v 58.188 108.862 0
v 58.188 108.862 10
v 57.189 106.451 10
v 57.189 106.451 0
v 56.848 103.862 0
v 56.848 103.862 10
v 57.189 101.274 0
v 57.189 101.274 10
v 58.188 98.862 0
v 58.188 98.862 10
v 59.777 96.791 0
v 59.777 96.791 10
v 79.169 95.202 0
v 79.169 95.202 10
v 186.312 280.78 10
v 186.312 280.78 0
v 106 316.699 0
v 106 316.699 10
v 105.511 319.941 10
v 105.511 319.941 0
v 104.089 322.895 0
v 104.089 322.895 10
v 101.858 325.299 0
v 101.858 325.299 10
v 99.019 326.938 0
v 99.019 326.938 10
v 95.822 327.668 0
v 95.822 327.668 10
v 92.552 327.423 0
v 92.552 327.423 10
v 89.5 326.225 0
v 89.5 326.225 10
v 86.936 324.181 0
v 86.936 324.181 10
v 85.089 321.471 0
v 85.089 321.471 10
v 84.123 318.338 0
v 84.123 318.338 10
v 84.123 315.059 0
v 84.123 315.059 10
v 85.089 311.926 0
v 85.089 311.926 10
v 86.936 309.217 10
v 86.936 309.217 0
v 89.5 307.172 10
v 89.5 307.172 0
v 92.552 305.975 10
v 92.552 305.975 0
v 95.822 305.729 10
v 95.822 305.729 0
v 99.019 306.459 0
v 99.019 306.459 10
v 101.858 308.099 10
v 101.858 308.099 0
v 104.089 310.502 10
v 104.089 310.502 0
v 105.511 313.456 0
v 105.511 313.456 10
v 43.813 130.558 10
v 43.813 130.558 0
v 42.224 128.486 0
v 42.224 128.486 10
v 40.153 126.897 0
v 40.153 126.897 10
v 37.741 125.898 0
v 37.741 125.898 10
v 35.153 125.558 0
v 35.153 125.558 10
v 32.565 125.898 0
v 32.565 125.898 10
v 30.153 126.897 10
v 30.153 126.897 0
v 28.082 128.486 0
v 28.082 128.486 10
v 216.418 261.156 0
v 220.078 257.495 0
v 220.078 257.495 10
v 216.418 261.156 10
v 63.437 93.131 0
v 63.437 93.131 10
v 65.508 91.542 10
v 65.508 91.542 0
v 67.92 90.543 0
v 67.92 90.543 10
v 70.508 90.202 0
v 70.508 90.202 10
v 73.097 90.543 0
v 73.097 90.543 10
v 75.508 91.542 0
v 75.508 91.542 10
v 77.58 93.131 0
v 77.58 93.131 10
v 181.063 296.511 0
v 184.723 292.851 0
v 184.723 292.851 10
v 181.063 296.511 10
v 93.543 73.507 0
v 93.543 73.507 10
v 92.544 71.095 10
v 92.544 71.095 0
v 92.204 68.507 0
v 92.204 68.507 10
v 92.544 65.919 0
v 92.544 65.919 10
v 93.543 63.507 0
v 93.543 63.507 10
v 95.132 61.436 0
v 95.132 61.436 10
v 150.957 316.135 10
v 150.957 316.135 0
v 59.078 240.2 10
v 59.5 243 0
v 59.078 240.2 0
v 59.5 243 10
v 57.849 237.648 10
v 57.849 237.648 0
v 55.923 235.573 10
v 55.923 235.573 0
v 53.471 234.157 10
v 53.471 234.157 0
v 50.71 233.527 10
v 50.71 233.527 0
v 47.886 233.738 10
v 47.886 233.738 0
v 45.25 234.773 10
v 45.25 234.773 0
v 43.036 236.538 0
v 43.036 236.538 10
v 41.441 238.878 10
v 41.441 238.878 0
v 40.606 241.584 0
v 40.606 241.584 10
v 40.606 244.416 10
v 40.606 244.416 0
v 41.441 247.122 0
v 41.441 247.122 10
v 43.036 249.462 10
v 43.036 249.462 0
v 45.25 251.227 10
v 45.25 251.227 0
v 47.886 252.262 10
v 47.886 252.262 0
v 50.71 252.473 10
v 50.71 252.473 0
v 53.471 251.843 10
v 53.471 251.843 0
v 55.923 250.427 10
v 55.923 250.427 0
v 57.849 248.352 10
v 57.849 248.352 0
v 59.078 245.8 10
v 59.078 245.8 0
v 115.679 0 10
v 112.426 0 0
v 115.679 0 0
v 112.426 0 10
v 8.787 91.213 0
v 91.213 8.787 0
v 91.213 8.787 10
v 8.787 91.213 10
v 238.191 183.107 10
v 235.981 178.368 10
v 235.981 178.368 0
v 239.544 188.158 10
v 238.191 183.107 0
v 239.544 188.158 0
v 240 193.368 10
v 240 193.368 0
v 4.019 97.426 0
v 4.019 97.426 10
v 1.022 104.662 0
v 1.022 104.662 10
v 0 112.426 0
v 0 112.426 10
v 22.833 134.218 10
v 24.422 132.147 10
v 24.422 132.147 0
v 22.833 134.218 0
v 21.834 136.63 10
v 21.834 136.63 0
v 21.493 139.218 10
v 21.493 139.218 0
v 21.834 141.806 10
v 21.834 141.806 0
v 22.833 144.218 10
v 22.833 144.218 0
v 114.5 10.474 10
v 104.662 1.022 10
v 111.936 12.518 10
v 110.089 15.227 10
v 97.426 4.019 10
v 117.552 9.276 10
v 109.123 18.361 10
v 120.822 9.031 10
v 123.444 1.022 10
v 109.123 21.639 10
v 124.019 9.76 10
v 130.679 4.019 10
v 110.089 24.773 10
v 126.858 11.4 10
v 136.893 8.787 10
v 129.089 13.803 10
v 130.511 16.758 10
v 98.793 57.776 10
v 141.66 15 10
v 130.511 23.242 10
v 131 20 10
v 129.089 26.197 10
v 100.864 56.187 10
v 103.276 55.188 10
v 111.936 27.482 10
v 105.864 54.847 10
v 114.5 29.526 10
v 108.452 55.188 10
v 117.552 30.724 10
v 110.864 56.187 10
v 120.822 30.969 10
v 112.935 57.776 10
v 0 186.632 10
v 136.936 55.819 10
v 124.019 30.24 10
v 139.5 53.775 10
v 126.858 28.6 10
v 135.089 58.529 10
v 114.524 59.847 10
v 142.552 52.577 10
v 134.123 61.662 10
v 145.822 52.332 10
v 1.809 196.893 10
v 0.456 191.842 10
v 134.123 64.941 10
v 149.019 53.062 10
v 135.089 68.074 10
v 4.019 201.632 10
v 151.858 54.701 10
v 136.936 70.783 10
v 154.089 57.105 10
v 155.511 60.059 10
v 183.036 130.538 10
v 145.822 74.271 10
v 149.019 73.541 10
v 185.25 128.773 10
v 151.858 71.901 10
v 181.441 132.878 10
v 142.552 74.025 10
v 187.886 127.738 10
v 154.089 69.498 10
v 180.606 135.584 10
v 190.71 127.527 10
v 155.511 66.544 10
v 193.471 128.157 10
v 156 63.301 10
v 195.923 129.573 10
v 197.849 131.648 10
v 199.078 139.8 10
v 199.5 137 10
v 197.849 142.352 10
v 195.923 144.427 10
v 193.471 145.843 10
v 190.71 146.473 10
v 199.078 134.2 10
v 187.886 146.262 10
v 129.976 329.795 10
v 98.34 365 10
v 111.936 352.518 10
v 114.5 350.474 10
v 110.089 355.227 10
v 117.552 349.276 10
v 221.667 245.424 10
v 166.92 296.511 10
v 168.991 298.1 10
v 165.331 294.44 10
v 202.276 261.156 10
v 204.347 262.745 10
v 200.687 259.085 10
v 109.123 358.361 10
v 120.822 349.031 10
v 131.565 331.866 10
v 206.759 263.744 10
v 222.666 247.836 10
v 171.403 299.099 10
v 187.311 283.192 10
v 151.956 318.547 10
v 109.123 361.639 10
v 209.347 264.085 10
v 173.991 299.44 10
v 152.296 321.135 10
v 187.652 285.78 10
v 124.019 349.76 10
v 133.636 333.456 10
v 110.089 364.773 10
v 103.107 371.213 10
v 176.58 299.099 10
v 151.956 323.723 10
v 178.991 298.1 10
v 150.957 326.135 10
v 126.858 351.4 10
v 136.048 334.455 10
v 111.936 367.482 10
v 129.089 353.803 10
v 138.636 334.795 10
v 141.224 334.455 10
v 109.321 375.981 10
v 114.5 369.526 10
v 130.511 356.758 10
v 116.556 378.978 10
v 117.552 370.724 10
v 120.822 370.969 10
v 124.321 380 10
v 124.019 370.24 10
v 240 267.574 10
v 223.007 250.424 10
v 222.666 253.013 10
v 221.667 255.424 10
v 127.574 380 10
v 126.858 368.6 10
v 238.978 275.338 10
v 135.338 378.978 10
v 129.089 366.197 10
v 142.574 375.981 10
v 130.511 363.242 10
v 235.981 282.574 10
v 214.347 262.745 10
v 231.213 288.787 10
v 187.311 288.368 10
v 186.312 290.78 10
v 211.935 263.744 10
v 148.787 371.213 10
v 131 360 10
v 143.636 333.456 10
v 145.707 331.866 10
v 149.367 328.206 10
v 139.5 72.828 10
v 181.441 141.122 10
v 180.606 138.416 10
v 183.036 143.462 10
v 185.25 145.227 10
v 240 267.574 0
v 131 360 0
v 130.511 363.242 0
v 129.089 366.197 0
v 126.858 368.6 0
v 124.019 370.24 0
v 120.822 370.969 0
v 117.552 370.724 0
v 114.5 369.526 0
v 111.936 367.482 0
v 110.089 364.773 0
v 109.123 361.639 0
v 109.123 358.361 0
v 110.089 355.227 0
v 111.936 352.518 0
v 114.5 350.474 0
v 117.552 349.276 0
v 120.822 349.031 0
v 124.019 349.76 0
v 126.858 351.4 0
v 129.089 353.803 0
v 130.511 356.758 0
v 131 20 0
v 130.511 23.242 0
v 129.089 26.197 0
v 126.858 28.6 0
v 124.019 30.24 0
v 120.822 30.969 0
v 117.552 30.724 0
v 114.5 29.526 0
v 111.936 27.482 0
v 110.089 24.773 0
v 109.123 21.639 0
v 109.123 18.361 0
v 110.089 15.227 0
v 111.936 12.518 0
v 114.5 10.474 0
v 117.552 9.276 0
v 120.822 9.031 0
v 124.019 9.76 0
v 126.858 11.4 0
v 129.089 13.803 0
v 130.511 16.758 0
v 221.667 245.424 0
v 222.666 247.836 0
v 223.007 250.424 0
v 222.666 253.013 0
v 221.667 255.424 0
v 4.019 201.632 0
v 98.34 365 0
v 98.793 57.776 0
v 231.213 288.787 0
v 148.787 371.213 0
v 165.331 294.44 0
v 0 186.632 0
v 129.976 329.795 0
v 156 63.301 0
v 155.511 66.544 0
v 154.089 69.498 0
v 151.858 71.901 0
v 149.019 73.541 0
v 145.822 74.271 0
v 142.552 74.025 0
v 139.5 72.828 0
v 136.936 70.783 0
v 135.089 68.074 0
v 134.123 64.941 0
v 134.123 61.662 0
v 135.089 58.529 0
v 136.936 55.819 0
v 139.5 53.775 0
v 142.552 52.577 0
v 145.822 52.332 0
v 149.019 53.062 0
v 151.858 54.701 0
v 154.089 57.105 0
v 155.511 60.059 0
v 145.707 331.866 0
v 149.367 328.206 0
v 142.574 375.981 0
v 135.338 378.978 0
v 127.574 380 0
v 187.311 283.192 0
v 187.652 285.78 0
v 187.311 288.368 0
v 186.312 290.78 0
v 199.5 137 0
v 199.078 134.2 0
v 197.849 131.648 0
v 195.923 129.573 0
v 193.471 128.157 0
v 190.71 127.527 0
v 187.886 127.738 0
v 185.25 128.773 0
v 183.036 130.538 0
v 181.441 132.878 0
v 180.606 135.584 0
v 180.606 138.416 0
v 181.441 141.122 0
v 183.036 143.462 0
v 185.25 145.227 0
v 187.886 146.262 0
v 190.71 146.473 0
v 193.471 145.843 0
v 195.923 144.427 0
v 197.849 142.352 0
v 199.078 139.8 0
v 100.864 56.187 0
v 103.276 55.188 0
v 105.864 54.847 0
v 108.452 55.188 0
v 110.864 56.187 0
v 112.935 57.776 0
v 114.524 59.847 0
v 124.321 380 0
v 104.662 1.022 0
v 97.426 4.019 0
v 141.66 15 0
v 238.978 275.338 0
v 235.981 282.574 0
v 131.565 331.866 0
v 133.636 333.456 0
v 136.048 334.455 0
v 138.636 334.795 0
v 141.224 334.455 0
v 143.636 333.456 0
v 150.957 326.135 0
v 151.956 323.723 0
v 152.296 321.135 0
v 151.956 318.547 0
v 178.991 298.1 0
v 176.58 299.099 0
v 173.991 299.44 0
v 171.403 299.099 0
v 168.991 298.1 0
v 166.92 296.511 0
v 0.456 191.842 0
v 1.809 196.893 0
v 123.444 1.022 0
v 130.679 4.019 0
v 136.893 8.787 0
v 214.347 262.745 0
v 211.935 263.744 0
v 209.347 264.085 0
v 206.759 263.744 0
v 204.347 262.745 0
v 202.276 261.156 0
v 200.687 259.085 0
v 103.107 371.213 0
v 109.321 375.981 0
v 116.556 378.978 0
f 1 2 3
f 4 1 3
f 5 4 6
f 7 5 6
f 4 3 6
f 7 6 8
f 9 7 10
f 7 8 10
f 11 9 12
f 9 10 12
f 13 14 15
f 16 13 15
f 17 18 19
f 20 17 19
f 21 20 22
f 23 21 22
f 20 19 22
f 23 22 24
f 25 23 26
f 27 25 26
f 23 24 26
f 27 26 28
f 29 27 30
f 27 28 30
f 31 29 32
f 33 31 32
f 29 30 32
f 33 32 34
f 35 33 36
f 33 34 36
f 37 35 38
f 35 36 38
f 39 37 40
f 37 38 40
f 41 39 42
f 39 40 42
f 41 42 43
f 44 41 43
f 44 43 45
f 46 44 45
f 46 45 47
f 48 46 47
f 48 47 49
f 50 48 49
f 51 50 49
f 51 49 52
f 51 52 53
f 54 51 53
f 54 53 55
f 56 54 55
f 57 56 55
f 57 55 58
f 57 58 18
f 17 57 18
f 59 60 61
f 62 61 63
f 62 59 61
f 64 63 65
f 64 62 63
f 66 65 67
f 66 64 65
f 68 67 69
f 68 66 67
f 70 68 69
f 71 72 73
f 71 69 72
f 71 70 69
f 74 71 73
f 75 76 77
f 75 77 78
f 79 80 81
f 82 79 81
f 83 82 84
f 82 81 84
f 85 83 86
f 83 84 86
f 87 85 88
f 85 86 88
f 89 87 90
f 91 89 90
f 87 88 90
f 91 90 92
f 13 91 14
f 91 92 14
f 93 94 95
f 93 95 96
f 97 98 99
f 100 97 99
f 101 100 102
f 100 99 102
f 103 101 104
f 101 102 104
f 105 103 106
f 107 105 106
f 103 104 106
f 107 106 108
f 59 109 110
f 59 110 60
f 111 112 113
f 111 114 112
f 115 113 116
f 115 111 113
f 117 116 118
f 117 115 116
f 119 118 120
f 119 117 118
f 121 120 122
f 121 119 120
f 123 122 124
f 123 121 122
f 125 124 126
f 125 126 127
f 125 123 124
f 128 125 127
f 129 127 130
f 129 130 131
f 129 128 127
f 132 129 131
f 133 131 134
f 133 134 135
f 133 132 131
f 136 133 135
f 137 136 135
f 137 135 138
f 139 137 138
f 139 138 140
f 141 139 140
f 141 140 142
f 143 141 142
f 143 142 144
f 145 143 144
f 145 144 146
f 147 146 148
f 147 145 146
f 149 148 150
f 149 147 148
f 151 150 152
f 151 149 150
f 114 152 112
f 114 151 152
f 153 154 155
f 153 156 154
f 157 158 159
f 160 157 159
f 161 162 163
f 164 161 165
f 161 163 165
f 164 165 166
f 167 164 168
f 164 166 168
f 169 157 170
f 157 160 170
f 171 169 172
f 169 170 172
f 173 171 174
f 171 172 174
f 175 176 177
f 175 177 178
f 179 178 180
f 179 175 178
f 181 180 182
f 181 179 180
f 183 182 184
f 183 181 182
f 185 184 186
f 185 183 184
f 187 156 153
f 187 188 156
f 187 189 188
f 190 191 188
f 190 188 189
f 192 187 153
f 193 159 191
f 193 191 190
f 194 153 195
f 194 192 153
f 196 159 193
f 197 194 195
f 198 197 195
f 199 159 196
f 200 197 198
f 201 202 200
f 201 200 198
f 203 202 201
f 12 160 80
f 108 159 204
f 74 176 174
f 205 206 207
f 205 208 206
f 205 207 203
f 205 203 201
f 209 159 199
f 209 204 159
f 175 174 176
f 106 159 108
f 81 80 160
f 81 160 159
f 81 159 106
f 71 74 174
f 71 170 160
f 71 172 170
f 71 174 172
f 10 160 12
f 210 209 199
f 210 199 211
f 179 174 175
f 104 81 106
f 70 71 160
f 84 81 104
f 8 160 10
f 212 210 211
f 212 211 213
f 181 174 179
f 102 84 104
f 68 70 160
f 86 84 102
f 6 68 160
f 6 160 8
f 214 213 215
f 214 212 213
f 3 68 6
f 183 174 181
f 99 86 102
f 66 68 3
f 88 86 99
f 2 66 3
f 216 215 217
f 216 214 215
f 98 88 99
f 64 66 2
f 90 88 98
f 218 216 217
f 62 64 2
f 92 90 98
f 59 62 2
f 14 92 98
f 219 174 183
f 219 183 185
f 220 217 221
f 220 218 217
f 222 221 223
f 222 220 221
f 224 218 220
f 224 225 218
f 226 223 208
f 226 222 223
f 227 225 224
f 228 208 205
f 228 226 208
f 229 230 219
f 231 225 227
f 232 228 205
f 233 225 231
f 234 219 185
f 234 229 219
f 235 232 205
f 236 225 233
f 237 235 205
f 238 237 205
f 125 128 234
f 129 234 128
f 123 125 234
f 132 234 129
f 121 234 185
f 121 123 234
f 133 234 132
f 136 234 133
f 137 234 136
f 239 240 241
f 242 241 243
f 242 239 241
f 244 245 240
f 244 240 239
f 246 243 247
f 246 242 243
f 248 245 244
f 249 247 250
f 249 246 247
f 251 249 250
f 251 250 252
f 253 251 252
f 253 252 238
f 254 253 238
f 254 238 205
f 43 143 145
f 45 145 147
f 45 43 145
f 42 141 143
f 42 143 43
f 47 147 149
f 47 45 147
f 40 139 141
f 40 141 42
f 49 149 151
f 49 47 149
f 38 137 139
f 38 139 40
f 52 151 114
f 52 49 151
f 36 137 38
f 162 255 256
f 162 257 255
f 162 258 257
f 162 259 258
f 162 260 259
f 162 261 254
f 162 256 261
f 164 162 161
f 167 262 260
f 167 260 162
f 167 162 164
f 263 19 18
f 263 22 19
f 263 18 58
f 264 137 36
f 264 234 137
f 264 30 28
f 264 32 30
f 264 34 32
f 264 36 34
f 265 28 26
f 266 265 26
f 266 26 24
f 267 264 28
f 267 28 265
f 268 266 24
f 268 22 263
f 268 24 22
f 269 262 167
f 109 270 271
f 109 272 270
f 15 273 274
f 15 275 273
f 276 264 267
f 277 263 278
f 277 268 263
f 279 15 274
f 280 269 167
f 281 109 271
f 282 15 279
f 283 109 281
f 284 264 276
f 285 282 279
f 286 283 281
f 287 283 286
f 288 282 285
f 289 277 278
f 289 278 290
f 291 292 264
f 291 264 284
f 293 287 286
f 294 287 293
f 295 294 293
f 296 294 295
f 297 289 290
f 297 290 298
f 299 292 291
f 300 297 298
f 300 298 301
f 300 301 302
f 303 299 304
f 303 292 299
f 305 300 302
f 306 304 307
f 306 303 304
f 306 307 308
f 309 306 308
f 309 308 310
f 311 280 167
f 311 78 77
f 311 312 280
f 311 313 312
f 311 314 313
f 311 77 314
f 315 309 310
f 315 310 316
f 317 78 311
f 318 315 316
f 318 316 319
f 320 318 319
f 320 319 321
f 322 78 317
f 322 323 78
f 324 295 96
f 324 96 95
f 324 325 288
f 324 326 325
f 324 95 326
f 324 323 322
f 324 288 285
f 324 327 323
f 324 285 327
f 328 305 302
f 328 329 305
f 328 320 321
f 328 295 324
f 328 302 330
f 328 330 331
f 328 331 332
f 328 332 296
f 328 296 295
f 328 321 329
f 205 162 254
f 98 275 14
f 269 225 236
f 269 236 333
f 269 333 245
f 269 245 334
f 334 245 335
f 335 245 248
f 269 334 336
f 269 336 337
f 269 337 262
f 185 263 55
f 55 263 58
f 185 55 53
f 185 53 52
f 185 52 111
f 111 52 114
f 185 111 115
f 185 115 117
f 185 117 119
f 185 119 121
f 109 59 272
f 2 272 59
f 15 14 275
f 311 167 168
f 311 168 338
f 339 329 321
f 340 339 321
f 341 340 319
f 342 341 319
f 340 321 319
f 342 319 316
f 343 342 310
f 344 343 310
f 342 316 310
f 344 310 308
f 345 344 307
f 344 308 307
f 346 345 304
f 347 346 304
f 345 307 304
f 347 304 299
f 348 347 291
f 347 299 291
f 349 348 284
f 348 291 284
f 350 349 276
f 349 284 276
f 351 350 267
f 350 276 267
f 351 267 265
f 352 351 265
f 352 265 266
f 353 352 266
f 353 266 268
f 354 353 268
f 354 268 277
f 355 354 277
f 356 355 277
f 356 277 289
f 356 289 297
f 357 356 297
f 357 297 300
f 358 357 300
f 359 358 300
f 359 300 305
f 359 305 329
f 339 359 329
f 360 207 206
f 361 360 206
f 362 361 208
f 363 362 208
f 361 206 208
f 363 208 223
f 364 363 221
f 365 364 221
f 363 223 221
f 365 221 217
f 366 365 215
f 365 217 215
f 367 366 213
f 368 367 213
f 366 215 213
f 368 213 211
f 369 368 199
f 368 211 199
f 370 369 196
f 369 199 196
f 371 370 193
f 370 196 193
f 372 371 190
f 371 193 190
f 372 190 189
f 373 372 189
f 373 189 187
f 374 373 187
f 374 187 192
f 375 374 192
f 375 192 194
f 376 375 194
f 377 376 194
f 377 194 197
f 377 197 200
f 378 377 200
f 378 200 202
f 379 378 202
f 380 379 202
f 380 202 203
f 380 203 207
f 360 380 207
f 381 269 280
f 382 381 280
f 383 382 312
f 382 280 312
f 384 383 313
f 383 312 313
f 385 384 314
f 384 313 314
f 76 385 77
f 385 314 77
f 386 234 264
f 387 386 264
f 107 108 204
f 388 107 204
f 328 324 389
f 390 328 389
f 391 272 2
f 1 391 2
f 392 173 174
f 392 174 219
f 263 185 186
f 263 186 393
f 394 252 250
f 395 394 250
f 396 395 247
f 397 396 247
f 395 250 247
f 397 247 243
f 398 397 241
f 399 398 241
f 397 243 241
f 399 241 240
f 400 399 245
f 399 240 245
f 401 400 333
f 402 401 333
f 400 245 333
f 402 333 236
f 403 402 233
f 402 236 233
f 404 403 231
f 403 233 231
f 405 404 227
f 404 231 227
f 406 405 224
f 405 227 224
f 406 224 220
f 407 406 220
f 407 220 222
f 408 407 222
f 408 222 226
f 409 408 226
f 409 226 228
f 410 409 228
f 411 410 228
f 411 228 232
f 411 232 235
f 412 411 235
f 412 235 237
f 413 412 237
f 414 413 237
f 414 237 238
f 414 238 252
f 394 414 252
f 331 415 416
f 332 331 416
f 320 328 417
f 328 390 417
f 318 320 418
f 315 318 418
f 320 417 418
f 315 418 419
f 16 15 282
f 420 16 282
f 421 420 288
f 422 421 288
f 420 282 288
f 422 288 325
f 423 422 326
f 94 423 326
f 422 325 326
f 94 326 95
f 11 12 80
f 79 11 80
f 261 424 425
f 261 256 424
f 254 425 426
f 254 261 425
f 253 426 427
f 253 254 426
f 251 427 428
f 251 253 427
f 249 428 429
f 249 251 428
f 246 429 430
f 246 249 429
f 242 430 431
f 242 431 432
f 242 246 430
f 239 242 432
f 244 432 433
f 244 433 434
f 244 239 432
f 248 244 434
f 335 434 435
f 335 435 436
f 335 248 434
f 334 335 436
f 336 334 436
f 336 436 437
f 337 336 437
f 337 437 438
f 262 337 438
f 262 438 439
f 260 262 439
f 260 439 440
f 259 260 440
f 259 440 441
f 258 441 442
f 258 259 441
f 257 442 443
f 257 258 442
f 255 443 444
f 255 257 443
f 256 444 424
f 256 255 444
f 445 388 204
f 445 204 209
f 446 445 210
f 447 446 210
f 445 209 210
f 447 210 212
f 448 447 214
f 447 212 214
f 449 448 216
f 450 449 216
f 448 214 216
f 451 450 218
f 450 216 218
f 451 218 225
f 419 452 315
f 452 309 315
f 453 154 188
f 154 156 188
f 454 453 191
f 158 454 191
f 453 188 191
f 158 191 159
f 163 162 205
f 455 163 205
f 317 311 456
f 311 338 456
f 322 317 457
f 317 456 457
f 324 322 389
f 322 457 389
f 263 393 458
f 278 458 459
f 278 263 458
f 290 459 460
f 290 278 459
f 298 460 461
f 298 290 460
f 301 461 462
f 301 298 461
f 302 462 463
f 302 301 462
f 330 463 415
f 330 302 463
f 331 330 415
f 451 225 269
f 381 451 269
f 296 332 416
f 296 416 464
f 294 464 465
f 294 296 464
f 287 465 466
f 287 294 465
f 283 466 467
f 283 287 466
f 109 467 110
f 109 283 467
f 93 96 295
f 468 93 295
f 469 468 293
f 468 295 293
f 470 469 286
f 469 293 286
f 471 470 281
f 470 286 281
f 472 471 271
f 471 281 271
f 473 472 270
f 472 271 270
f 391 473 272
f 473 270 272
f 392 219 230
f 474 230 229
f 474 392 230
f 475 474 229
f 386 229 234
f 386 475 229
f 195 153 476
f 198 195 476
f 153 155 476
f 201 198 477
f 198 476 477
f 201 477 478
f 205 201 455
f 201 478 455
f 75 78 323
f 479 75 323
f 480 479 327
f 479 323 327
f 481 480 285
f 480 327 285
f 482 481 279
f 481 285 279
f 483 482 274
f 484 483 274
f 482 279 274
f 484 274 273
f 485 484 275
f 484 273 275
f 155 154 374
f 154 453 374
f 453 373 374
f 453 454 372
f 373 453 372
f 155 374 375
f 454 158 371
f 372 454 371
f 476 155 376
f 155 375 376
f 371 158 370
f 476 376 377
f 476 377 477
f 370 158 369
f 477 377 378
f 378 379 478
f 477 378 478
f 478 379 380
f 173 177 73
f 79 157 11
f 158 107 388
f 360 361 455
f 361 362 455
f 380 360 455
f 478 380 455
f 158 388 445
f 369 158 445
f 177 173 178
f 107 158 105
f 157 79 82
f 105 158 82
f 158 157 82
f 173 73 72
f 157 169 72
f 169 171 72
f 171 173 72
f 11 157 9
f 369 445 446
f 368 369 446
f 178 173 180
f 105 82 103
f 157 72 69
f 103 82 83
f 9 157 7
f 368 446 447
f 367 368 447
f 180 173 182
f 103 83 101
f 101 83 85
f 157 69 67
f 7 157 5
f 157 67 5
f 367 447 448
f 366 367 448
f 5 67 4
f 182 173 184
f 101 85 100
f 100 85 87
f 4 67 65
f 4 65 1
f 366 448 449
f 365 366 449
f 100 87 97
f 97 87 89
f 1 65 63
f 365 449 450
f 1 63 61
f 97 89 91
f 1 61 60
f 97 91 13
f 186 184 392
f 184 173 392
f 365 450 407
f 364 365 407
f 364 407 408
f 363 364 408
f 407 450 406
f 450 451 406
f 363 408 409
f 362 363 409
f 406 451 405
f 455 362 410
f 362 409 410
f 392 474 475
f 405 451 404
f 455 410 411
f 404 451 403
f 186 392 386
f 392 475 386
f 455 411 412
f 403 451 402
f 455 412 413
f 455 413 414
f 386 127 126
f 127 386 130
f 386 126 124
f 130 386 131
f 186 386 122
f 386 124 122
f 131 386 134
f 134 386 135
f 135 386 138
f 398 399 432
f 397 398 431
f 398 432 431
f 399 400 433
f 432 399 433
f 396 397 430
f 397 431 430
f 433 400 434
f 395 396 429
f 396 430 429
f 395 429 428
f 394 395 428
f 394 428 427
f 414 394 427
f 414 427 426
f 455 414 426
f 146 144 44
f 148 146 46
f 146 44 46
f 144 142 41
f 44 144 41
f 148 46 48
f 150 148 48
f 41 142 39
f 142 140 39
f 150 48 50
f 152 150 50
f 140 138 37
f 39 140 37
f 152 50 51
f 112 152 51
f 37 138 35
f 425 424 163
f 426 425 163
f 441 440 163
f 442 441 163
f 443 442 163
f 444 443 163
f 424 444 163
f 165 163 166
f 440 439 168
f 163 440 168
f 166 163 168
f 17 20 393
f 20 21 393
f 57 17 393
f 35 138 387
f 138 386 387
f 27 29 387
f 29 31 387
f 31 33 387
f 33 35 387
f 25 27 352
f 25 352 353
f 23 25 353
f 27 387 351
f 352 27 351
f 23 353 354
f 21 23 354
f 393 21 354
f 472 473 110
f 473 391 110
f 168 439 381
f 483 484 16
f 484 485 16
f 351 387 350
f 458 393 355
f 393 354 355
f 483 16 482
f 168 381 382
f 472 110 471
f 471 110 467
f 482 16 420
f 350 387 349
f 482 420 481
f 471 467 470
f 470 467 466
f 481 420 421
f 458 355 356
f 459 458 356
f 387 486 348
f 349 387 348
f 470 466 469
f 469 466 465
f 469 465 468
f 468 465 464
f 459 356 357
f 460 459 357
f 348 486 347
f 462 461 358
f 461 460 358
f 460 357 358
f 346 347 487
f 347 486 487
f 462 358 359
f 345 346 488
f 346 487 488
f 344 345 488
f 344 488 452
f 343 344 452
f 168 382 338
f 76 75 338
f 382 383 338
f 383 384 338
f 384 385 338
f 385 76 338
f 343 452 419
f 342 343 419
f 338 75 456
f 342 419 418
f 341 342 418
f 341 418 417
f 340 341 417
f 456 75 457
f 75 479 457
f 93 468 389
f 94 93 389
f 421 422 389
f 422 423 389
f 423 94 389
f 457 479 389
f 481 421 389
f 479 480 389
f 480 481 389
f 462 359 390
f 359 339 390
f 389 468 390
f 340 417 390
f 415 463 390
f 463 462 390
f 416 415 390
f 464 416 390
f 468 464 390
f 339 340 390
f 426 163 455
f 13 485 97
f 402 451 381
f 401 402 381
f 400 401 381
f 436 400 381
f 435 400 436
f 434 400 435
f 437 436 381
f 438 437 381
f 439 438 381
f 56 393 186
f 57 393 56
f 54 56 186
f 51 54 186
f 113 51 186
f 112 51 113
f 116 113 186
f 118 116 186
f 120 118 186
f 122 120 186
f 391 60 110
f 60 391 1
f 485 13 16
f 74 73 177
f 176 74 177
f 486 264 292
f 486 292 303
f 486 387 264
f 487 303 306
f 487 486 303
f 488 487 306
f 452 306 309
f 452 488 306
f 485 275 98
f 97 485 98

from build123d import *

# Parameters (mm, degrees)
SKETCH_1_W           = 200
SKETCH_1_H           = 380
EXTRUDE_1_DEPTH      = 10
SKETCH_2_R           = 11
CUT_EXTRUDE_1_DEPTH  = 430.534631898
SKETCH_3_R           = 8
CUT_EXTRUDE_2_DEPTH  = 430.534631898
SKETCH_4_R           = 9.5
CUT_EXTRUDE_3_DEPTH  = 6
CUT_EXTRUDE_START    = -6
SKETCH_5_R           = 9.5
CUT_EXTRUDE_4_DEPTH  = 6
SKETCH_6_R           = 11
CUT_EXTRUDE_5_DEPTH  = 430.534631898
SKETCH_7_R           = 8
CUT_EXTRUDE_6_DEPTH  = 430.534631898
SKETCH_8_R           = 9.5
CUT_EXTRUDE_7_DEPTH  = 6
SKETCH_9_R           = 9.5
CUT_EXTRUDE_8_DEPTH  = 6
SKETCH_10_W          = 40
SKETCH_10_H          = 380
EXTRUDE_3_DEPTH      = 10
CUT_EXTRUDE_9_DEPTH  = 450.55533586
CHAMFER_1_SIZE       = 100
FILLET_1_R           = 30
CUT_EXTRUDE_10_DEPTH = 450.55533586


with BuildPart() as part:
    # 草图1 → 凸台-拉伸1 (new body)
    with BuildSketch(Plane.XY):
        with Locations((100, 190)):
            Rectangle(SKETCH_1_W, SKETCH_1_H)
    extrude(amount=EXTRUDE_1_DEPTH)

    # 草图2 → 切除-拉伸1 (cut, through all)
    with BuildSketch(Plane.XY.offset(10)):
        with Locations((120, 20)):
            Circle(SKETCH_2_R)
        with Locations((145, 63.301270189)):
            Circle(SKETCH_2_R)
    extrude(amount=-CUT_EXTRUDE_1_DEPTH, mode=Mode.SUBTRACT)

    # 草图3 → 切除-拉伸2 (cut, through all)
    with BuildSketch(Plane.XY.offset(10)):
        with Locations((50, 243)):
            Circle(SKETCH_3_R)
    extrude(amount=-CUT_EXTRUDE_2_DEPTH, mode=Mode.SUBTRACT)

    # 草图4 → 切除-拉伸3 (cut)
    with BuildSketch(Plane.XY.offset(10)):
        with Locations((50, 243)):
            Circle(SKETCH_4_R)
    extrude(amount=-CUT_EXTRUDE_3_DEPTH, mode=Mode.SUBTRACT)

    # 草图5 → 切除-拉伸4 (cut)
    with BuildSketch(Plane(origin=(0, 0, 0), x_dir=(-1, 0, 0), z_dir=(0, 0, -1)).offset(CUT_EXTRUDE_START)):
        with Locations(Location((-50, 243, 0), (0, 0, 180))):
            Circle(SKETCH_5_R)
    extrude(amount=CUT_EXTRUDE_4_DEPTH, mode=Mode.SUBTRACT)

    # 草图6 → 切除-拉伸5 (cut, through all)
    with BuildSketch(Plane.XY.offset(10)):
        with Locations((95, 316.698729811)):
            Circle(SKETCH_6_R)
        with Locations((120, 360)):
            Circle(SKETCH_6_R)
    extrude(amount=-CUT_EXTRUDE_5_DEPTH, mode=Mode.SUBTRACT)

    # 草图7 → 切除-拉伸6 (cut, through all)
    with BuildSketch(Plane.XY.offset(10)):
        with Locations((190, 137)):
            Circle(SKETCH_7_R)
    extrude(amount=-CUT_EXTRUDE_6_DEPTH, mode=Mode.SUBTRACT)

    # 草图8 → 切除-拉伸7 (cut)
    with BuildSketch(Plane.XY.offset(10)):
        with Locations((190, 137)):
            Circle(SKETCH_8_R)
    extrude(amount=-CUT_EXTRUDE_7_DEPTH, mode=Mode.SUBTRACT)

    # 草图9 → 切除-拉伸8 (cut)
    with BuildSketch(Plane(origin=(0, 0, 0), x_dir=(-1, 0, 0), z_dir=(0, 0, -1)).offset(CUT_EXTRUDE_START)):
        with Locations(Location((-190, 137, 0), (0, 0, 180))):
            Circle(SKETCH_9_R)
    extrude(amount=CUT_EXTRUDE_8_DEPTH, mode=Mode.SUBTRACT)

    # 草图10 → 凸台-拉伸3 (add)
    with BuildSketch(Plane.XY.offset(10)):
        with Locations((220, 190)):
            Rectangle(SKETCH_10_W, SKETCH_10_H)
    extrude(amount=-EXTRUDE_3_DEPTH)

    # 草图11 → 切除-拉伸9 (cut, through all)
    with BuildSketch(Plane.XY.offset(10)):
        Polygon((240, 185.32943641), (133, 0), (240, 0), align=None)
        Polygon((0, 380), (0, 194.67056359), (107, 380), align=None)
    extrude(amount=-CUT_EXTRUDE_9_DEPTH, mode=Mode.SUBTRACT)

    # 倒角1
    chamfer_1_edges = [part.edges().sort_by_distance(p)[0] for p in [
        (240, 380, 5),
        (0, 0, 5),
    ]]
    chamfer(chamfer_1_edges, length=CHAMFER_1_SIZE)

    # 圆角1
    fillet_1_edges = [part.edges().sort_by_distance(p)[0] for p in [
        (240, 280, 5),
        (140, 380, 5),
        (100, 0, 5),
        (0, 100, 5),
        (240, 185.32943641, 5),
        (133, 0, 5),
        (107, 380, 5),
        (0, 194.67056359, 5),
    ]]
    fillet(fillet_1_edges, radius=FILLET_1_R)

    # 草图12 → 切除-拉伸10 (cut, through all)
    with BuildSketch(Plane.XY.offset(10)):
        with BuildLine():
            Line((28.082053888, 128.486488607), (24.42179985, 132.146742645))
            ThreePointArc((24.42179985, 132.146742645), (21.578419048, 137.912548534), (22.832613624, 144.217810457))
            Line((22.832613624, 144.217810457), (129.975855095, 329.795348372))
            ThreePointArc((129.975855095, 329.795348372), (137.330847211, 334.709796986), (145.707176945, 331.866416184))
            Line((145.707176945, 331.866416184), (149.367430983, 328.206162146))
            ThreePointArc((149.367430983, 328.206162146), (152.210811785, 322.440356256), (150.956617209, 316.135094334))
            Line((150.956617209, 316.135094334), (43.813375738, 130.557556419))
            ThreePointArc((43.813375738, 130.557556419), (36.458383622, 125.643107805), (28.082053888, 128.486488607))
        make_face()
        with BuildLine():
            Line((165.331194154, 294.440009313), (58.187952683, 108.862471397))
            ThreePointArc((58.187952683, 108.862471397), (56.933758108, 102.557209475), (59.777138909, 96.791403586))
            Line((59.777138909, 96.791403586), (63.437392947, 93.131149548))
            ThreePointArc((63.437392947, 93.131149548), (71.813722681, 90.287768746), (79.168714797, 95.20221736))
            Line((79.168714797, 95.20221736), (186.311956268, 280.779755275))
            ThreePointArc((186.311956268, 280.779755275), (187.566150844, 287.085017197), (184.722770042, 292.850823087))
            Line((184.722770042, 292.850823087), (181.062516004, 296.511077125))
            ThreePointArc((181.062516004, 296.511077125), (172.68618627, 299.354457927), (165.331194154, 294.440009313))
        make_face()
        with BuildLine():
            Line((200.686533214, 259.084670253), (93.543291743, 73.507132338))
            ThreePointArc((93.543291743, 73.507132338), (92.289097167, 67.201870416), (95.132477969, 61.436064526))
            Line((95.132477969, 61.436064526), (98.792732007, 57.775810488))
            ThreePointArc((98.792732007, 57.775810488), (107.169061741, 54.932429686), (114.524053856, 59.8468783))
            Line((114.524053856, 59.8468783), (221.667295327, 245.424416216))
            ThreePointArc((221.667295327, 245.424416216), (222.921489903, 251.729678138), (220.078109101, 257.495484027))
            Line((220.078109101, 257.495484027), (216.417855063, 261.155738065))
            ThreePointArc((216.417855063, 261.155738065), (208.041525329, 263.999118867), (200.686533214, 259.084670253))
        make_face()
    extrude(amount=-CUT_EXTRUDE_10_DEPTH, mode=Mode.SUBTRACT)


solid = part.part
